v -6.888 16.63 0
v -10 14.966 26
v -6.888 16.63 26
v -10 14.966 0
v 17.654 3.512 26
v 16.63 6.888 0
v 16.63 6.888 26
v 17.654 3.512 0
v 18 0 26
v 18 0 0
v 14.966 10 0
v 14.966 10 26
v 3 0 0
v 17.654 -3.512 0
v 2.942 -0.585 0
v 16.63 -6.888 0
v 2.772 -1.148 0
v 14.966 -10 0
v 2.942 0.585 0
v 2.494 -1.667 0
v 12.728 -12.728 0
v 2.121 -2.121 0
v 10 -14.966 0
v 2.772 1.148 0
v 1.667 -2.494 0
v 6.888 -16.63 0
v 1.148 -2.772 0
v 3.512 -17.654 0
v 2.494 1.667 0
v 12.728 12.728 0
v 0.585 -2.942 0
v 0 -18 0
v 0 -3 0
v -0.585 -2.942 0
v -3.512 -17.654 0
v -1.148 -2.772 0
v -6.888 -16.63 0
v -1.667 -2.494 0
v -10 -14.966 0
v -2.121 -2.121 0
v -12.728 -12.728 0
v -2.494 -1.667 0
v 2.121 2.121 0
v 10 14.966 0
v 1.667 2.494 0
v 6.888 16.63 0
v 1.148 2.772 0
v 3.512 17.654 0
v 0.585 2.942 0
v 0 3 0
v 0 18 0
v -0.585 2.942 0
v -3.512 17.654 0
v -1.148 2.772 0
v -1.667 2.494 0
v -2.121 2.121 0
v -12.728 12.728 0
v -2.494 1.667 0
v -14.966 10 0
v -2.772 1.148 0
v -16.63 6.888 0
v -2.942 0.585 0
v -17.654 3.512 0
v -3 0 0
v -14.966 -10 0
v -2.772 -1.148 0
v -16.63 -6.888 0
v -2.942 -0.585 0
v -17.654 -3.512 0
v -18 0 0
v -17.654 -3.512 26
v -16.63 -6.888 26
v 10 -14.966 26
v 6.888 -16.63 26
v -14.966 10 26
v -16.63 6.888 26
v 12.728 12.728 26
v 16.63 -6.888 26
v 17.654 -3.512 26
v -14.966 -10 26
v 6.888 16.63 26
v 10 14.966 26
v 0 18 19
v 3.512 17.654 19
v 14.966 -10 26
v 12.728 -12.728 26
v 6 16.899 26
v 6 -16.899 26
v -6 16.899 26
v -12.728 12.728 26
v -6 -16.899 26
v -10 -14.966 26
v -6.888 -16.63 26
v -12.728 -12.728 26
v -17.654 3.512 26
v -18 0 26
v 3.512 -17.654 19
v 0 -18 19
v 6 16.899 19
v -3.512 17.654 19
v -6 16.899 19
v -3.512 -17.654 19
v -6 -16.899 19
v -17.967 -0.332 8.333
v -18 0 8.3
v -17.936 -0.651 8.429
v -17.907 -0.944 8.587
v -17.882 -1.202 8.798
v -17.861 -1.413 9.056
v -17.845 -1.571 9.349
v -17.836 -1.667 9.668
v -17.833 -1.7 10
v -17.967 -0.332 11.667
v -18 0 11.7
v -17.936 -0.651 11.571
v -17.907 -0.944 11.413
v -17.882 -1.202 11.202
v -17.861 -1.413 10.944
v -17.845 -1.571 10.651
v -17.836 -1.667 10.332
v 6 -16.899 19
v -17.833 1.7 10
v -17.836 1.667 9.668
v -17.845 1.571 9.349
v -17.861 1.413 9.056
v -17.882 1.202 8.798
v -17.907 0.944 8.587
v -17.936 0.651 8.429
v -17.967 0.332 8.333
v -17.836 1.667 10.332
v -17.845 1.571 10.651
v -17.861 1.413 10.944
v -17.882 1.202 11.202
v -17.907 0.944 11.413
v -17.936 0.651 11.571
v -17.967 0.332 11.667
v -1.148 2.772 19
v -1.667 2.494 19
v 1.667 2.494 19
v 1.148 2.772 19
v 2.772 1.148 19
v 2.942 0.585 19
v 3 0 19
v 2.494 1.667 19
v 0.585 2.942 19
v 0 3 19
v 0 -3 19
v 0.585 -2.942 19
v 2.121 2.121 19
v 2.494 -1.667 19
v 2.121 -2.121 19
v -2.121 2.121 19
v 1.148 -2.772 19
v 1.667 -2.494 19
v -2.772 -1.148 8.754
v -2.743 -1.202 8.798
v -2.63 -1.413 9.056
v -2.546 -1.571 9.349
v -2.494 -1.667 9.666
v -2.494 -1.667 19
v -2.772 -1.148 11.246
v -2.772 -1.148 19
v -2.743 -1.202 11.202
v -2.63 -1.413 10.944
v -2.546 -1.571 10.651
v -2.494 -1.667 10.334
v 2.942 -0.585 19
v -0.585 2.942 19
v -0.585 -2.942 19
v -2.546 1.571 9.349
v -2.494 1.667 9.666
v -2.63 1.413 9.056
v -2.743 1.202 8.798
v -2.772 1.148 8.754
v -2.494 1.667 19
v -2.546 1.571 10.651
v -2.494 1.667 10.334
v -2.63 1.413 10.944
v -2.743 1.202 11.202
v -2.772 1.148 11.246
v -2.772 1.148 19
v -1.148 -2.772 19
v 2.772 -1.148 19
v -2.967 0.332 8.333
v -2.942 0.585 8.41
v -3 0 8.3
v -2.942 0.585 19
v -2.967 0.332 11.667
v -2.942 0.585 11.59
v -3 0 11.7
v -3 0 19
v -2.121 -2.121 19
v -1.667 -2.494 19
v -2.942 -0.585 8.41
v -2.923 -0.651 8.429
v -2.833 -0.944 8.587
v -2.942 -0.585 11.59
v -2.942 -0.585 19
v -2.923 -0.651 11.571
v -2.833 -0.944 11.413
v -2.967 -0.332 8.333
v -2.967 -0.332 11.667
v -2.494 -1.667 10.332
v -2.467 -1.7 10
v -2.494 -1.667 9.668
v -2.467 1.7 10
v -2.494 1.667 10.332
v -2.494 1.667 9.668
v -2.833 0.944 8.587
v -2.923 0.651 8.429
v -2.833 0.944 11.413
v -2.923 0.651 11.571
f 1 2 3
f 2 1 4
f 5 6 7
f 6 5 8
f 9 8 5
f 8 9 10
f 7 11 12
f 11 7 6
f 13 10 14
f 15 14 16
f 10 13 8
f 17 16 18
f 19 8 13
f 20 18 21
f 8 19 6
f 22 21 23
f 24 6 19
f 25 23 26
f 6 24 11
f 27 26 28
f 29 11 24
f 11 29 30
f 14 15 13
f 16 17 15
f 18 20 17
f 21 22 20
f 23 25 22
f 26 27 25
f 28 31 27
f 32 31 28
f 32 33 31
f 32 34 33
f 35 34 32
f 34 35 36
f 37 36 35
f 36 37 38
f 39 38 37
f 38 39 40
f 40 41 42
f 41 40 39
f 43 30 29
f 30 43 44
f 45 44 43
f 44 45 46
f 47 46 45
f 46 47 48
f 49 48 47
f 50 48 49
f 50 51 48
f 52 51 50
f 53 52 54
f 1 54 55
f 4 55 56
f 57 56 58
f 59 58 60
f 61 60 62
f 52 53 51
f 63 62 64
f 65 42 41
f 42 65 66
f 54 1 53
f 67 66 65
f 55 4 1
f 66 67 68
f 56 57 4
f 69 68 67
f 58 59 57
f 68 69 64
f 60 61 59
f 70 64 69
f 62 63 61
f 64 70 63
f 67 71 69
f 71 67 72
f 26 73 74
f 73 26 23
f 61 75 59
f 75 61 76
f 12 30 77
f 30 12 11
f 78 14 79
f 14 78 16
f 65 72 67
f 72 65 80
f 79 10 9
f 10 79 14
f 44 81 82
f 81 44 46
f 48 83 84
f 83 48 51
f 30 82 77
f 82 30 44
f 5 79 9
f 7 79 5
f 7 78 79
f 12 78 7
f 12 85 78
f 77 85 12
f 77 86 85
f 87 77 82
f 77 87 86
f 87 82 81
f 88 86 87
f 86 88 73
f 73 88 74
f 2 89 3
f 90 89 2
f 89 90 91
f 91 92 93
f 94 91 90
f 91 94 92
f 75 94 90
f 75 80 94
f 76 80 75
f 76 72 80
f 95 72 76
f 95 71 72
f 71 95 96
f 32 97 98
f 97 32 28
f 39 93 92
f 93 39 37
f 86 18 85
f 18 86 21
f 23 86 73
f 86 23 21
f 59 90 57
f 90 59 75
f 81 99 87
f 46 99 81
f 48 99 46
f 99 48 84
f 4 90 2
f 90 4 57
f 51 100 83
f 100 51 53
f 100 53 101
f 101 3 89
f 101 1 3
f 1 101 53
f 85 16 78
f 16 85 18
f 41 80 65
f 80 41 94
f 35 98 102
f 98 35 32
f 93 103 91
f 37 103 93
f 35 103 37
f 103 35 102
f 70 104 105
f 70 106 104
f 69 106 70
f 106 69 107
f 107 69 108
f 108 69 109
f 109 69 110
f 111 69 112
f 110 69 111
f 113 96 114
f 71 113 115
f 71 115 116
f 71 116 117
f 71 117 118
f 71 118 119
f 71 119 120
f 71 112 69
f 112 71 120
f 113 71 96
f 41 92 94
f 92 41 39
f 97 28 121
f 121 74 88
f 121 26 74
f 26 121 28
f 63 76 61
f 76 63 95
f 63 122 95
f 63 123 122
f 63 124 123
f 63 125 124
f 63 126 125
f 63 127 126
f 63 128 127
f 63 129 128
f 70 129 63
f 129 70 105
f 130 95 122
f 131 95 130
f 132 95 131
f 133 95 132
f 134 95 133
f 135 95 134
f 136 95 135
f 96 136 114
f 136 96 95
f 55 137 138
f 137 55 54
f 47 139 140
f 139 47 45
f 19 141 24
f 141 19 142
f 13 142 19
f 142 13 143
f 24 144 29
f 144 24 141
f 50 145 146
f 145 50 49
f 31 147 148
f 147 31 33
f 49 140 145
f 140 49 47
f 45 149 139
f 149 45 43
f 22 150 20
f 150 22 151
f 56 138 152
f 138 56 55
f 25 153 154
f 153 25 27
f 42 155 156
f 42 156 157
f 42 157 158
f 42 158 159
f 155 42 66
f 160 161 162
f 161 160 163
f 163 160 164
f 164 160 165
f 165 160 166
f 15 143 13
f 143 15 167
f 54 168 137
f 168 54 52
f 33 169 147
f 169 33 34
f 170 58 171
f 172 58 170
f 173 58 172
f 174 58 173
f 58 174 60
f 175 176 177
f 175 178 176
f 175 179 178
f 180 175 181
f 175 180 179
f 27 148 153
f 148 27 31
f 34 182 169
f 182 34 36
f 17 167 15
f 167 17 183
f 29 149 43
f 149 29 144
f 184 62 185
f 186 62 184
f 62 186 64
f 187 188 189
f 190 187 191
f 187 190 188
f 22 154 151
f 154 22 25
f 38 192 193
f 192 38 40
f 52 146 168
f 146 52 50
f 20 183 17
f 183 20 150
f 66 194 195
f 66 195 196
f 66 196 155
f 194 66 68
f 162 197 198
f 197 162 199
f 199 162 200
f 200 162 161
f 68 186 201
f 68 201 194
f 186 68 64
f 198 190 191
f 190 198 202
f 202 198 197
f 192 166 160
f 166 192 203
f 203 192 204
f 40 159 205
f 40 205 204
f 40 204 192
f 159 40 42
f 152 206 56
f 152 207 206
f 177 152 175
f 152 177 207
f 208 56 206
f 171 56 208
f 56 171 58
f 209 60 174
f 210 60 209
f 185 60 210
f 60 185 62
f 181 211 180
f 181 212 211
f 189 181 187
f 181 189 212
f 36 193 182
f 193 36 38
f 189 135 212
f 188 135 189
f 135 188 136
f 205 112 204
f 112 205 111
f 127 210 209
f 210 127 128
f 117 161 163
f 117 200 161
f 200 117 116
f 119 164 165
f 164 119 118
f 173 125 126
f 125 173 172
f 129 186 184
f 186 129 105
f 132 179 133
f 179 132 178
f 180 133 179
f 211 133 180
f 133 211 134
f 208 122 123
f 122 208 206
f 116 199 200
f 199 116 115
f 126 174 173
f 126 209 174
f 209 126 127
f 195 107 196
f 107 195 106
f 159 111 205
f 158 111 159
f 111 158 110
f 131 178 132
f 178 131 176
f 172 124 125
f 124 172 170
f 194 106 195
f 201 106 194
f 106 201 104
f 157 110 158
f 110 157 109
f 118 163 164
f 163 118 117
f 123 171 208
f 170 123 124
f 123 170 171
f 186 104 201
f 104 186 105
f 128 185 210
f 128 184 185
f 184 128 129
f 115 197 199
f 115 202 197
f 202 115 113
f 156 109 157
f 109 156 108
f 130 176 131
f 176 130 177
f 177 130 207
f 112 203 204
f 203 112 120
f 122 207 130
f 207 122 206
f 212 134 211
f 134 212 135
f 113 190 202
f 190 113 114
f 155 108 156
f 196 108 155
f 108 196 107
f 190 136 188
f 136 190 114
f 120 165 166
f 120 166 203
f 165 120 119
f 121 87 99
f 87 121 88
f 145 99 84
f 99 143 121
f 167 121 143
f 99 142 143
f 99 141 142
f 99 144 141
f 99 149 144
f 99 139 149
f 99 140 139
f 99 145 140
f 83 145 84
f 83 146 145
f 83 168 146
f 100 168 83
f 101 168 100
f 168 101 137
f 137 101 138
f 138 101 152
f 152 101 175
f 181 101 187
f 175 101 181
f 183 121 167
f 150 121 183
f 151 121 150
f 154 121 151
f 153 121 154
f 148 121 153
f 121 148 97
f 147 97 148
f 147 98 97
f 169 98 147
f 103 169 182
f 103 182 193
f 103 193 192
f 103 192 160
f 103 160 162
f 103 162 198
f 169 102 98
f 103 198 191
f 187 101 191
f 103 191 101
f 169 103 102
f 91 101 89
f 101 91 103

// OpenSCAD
$fn = 32;

// ----------------------------------------------------------------------
// Oldham coupling hub: 36 x 26 mm
// ----------------------------------------------------------------------

// --- parameters (mm) ---
hub_d = 36;               // hub diameter
hub_l = 20;               // hub length
bore_d = 6;               // shaft bore
tongue_w = 12;            // drive tongue width
tongue_h = 6;             // drive tongue height
set_d = 3.4;              // set screw tap hole

module hub() {
  /* the slot side is a raised disc with a groove milled across it */
  cylinder(h = hub_l + tongue_h, d = hub_d);
}

difference() {
  hub();
  translate([0, 0, -1]) cylinder(h = hub_l + tongue_h + 2, d = bore_d);
  translate([-hub_d / 2 - 1, 0, hub_l * 0.5])
    rotate([0, 90, 0]) cylinder(h = hub_d / 2 + 2, d = set_d);
  translate([-tongue_w / 2, -hub_d / 2 - 1, hub_l - 1])
    cube([tongue_w, hub_d + 2, tongue_h + 1]);
}
